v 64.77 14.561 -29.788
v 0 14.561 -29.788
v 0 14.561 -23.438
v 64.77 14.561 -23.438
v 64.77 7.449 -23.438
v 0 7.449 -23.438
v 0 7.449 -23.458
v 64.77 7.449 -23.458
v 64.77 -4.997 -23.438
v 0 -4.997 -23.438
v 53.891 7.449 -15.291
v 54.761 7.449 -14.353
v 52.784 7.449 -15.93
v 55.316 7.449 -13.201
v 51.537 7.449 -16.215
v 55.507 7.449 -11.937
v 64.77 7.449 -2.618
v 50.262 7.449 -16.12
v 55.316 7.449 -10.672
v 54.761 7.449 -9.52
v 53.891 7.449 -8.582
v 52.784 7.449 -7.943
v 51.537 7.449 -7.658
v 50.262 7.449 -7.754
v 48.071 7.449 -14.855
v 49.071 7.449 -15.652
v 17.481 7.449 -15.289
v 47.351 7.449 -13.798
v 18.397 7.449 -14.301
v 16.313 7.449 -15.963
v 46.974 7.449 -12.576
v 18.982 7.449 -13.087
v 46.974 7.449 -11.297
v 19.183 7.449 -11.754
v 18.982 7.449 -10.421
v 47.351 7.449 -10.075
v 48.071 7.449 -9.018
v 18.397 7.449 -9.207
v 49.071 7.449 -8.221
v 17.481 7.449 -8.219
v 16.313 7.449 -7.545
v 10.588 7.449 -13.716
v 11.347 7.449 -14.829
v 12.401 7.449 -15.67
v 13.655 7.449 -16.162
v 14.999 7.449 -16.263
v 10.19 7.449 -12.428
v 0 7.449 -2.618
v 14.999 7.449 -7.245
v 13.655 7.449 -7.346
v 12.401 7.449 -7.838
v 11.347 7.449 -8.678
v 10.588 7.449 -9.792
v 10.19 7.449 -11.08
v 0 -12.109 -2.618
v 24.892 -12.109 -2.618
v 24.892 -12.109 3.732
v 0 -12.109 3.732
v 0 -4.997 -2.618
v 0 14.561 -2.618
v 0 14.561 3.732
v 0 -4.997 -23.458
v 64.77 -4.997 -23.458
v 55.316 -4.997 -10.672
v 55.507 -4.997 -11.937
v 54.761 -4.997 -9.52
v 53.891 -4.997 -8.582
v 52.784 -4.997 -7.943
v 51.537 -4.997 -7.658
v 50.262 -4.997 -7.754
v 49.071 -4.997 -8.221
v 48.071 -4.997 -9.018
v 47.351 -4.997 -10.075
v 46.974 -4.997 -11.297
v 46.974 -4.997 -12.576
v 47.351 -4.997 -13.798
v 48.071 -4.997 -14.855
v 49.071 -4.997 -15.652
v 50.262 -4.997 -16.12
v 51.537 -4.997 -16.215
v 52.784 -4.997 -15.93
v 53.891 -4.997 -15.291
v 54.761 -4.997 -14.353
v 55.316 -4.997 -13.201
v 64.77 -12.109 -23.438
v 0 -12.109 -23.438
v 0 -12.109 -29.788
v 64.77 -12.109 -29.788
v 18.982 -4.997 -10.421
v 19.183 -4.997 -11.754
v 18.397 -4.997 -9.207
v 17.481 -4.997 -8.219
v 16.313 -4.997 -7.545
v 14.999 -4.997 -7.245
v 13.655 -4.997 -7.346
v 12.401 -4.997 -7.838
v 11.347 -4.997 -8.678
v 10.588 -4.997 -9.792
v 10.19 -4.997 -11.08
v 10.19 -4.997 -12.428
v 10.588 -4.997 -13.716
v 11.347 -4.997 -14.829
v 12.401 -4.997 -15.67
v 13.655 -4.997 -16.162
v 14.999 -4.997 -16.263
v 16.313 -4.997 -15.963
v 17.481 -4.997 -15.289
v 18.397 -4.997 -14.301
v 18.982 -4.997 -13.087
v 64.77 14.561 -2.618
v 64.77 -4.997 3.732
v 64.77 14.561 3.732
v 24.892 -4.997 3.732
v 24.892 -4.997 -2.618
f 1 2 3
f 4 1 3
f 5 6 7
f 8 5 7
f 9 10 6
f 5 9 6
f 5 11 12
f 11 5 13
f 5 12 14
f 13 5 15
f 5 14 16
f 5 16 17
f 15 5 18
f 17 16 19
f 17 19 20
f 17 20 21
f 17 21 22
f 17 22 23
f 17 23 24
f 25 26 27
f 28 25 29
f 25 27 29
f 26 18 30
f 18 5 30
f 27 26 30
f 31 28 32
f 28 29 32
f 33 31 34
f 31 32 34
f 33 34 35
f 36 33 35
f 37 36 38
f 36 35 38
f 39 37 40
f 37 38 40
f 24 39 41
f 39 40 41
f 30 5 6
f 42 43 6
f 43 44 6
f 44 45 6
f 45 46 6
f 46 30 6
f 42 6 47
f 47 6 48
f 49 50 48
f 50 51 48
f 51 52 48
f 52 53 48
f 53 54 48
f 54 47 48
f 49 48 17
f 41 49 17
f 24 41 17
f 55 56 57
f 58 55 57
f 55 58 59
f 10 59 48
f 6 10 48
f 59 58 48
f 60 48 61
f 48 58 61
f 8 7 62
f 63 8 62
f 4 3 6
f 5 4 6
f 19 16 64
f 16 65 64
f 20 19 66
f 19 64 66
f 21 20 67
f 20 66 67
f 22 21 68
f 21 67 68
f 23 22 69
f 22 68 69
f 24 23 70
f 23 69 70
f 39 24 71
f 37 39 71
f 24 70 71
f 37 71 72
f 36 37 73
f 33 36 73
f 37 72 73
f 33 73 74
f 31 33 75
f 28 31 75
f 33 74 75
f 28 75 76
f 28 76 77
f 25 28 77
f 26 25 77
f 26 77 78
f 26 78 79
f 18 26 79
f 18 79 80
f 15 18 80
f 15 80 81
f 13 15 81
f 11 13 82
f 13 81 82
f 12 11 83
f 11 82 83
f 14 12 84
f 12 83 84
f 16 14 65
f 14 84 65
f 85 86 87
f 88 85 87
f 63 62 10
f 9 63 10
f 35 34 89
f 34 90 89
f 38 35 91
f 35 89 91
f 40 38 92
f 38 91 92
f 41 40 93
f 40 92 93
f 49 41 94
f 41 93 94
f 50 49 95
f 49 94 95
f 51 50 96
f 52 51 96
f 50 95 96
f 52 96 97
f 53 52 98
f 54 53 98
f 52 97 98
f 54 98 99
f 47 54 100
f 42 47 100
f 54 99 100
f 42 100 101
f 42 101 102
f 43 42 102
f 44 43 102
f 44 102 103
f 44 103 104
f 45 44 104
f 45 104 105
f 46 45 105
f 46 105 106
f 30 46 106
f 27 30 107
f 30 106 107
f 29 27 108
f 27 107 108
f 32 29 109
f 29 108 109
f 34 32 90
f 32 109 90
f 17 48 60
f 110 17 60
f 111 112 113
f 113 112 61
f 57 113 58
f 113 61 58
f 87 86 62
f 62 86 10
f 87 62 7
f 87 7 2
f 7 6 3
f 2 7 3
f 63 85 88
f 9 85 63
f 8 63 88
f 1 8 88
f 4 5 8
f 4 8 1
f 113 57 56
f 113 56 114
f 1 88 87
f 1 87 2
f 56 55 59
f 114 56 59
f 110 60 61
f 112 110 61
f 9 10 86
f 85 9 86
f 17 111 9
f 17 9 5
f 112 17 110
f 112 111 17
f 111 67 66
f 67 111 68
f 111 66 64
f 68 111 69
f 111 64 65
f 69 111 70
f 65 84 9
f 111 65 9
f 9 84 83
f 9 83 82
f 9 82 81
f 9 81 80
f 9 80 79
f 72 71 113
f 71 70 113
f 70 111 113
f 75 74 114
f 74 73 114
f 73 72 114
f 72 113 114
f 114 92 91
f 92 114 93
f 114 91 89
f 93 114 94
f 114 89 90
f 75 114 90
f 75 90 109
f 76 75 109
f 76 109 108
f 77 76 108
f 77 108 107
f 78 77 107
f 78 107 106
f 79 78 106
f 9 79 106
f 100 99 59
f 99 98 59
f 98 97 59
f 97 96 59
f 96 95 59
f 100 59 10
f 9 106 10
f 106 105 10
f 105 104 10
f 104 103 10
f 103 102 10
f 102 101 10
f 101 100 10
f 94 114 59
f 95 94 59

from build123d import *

# Parameters (mm, degrees)
F0_W          = 7.112
F0_H          = 6.35
F1_DEPTH      = 24.892
F3_DEPTH      = 64.77
F4_R          = 4.5216032169
F4_R_2        = 4.2905673548
F5_DEPTH      = 122.428
F5_DEPTH_BACK = 71.628


# Not quite as in the source:
# - a feature of the source that left no trace in its solid (it failed there, or was rolled back) is left out


with BuildPart() as f1:
    # F0 (on Right) → F1 (new body)
    with BuildSketch(Plane.YZ):
        with Locations((-8.5533469116, 0.5566177108)):
            Rectangle(F0_W, F0_H)
    extrude(amount=F1_DEPTH)

    # F0 (on Right) → F3 (join)
    with BuildSketch(Plane.YZ):
        with Locations((11.0046530884, 0.5566177108)):
            Rectangle(F0_W, F0_H)
        Polygon((7.4486530884, 3.7316177108), (-4.9973469116, 3.7316177108), (-4.9973469116, -2.6183822892), (-4.9973469116, -23.4382234705), (7.4486530884, -23.4382234705), (7.4486530884, -2.6183822892), align=None)
    extrude(amount=F3_DEPTH)

    # F4 (on Front) → F5 (cut, two sides)
    with BuildSketch(Plane.XZ) as f5_sk:
        with Locations((14.6613549441, -11.7537407205)):
            Circle(F4_R)
        with Locations((51.2163378298, -11.9365155697)):
            Circle(F4_R_2)
    extrude(amount=F5_DEPTH, mode=Mode.SUBTRACT)
    extrude(f5_sk.sketch, amount=-F5_DEPTH_BACK, mode=Mode.SUBTRACT)


with BuildPart() as f3:
    # F0 (on Right) → F3, piece 2 (new body)
    with BuildSketch(Plane.YZ):
        Polygon((-4.9973469116, -23.457913017), (-4.9973469116, -23.4382234705), (-12.1093469116, -23.4382234705), (-12.1093469116, -29.7882234705), (14.5606530884, -29.7882234705), (14.5606530884, -23.4382234705), (7.4486530884, -23.4382234705), (7.4486530884, -23.457913017), align=None)
    extrude(amount=F3_DEPTH)


solid = Compound([f1.part, f3.part])
